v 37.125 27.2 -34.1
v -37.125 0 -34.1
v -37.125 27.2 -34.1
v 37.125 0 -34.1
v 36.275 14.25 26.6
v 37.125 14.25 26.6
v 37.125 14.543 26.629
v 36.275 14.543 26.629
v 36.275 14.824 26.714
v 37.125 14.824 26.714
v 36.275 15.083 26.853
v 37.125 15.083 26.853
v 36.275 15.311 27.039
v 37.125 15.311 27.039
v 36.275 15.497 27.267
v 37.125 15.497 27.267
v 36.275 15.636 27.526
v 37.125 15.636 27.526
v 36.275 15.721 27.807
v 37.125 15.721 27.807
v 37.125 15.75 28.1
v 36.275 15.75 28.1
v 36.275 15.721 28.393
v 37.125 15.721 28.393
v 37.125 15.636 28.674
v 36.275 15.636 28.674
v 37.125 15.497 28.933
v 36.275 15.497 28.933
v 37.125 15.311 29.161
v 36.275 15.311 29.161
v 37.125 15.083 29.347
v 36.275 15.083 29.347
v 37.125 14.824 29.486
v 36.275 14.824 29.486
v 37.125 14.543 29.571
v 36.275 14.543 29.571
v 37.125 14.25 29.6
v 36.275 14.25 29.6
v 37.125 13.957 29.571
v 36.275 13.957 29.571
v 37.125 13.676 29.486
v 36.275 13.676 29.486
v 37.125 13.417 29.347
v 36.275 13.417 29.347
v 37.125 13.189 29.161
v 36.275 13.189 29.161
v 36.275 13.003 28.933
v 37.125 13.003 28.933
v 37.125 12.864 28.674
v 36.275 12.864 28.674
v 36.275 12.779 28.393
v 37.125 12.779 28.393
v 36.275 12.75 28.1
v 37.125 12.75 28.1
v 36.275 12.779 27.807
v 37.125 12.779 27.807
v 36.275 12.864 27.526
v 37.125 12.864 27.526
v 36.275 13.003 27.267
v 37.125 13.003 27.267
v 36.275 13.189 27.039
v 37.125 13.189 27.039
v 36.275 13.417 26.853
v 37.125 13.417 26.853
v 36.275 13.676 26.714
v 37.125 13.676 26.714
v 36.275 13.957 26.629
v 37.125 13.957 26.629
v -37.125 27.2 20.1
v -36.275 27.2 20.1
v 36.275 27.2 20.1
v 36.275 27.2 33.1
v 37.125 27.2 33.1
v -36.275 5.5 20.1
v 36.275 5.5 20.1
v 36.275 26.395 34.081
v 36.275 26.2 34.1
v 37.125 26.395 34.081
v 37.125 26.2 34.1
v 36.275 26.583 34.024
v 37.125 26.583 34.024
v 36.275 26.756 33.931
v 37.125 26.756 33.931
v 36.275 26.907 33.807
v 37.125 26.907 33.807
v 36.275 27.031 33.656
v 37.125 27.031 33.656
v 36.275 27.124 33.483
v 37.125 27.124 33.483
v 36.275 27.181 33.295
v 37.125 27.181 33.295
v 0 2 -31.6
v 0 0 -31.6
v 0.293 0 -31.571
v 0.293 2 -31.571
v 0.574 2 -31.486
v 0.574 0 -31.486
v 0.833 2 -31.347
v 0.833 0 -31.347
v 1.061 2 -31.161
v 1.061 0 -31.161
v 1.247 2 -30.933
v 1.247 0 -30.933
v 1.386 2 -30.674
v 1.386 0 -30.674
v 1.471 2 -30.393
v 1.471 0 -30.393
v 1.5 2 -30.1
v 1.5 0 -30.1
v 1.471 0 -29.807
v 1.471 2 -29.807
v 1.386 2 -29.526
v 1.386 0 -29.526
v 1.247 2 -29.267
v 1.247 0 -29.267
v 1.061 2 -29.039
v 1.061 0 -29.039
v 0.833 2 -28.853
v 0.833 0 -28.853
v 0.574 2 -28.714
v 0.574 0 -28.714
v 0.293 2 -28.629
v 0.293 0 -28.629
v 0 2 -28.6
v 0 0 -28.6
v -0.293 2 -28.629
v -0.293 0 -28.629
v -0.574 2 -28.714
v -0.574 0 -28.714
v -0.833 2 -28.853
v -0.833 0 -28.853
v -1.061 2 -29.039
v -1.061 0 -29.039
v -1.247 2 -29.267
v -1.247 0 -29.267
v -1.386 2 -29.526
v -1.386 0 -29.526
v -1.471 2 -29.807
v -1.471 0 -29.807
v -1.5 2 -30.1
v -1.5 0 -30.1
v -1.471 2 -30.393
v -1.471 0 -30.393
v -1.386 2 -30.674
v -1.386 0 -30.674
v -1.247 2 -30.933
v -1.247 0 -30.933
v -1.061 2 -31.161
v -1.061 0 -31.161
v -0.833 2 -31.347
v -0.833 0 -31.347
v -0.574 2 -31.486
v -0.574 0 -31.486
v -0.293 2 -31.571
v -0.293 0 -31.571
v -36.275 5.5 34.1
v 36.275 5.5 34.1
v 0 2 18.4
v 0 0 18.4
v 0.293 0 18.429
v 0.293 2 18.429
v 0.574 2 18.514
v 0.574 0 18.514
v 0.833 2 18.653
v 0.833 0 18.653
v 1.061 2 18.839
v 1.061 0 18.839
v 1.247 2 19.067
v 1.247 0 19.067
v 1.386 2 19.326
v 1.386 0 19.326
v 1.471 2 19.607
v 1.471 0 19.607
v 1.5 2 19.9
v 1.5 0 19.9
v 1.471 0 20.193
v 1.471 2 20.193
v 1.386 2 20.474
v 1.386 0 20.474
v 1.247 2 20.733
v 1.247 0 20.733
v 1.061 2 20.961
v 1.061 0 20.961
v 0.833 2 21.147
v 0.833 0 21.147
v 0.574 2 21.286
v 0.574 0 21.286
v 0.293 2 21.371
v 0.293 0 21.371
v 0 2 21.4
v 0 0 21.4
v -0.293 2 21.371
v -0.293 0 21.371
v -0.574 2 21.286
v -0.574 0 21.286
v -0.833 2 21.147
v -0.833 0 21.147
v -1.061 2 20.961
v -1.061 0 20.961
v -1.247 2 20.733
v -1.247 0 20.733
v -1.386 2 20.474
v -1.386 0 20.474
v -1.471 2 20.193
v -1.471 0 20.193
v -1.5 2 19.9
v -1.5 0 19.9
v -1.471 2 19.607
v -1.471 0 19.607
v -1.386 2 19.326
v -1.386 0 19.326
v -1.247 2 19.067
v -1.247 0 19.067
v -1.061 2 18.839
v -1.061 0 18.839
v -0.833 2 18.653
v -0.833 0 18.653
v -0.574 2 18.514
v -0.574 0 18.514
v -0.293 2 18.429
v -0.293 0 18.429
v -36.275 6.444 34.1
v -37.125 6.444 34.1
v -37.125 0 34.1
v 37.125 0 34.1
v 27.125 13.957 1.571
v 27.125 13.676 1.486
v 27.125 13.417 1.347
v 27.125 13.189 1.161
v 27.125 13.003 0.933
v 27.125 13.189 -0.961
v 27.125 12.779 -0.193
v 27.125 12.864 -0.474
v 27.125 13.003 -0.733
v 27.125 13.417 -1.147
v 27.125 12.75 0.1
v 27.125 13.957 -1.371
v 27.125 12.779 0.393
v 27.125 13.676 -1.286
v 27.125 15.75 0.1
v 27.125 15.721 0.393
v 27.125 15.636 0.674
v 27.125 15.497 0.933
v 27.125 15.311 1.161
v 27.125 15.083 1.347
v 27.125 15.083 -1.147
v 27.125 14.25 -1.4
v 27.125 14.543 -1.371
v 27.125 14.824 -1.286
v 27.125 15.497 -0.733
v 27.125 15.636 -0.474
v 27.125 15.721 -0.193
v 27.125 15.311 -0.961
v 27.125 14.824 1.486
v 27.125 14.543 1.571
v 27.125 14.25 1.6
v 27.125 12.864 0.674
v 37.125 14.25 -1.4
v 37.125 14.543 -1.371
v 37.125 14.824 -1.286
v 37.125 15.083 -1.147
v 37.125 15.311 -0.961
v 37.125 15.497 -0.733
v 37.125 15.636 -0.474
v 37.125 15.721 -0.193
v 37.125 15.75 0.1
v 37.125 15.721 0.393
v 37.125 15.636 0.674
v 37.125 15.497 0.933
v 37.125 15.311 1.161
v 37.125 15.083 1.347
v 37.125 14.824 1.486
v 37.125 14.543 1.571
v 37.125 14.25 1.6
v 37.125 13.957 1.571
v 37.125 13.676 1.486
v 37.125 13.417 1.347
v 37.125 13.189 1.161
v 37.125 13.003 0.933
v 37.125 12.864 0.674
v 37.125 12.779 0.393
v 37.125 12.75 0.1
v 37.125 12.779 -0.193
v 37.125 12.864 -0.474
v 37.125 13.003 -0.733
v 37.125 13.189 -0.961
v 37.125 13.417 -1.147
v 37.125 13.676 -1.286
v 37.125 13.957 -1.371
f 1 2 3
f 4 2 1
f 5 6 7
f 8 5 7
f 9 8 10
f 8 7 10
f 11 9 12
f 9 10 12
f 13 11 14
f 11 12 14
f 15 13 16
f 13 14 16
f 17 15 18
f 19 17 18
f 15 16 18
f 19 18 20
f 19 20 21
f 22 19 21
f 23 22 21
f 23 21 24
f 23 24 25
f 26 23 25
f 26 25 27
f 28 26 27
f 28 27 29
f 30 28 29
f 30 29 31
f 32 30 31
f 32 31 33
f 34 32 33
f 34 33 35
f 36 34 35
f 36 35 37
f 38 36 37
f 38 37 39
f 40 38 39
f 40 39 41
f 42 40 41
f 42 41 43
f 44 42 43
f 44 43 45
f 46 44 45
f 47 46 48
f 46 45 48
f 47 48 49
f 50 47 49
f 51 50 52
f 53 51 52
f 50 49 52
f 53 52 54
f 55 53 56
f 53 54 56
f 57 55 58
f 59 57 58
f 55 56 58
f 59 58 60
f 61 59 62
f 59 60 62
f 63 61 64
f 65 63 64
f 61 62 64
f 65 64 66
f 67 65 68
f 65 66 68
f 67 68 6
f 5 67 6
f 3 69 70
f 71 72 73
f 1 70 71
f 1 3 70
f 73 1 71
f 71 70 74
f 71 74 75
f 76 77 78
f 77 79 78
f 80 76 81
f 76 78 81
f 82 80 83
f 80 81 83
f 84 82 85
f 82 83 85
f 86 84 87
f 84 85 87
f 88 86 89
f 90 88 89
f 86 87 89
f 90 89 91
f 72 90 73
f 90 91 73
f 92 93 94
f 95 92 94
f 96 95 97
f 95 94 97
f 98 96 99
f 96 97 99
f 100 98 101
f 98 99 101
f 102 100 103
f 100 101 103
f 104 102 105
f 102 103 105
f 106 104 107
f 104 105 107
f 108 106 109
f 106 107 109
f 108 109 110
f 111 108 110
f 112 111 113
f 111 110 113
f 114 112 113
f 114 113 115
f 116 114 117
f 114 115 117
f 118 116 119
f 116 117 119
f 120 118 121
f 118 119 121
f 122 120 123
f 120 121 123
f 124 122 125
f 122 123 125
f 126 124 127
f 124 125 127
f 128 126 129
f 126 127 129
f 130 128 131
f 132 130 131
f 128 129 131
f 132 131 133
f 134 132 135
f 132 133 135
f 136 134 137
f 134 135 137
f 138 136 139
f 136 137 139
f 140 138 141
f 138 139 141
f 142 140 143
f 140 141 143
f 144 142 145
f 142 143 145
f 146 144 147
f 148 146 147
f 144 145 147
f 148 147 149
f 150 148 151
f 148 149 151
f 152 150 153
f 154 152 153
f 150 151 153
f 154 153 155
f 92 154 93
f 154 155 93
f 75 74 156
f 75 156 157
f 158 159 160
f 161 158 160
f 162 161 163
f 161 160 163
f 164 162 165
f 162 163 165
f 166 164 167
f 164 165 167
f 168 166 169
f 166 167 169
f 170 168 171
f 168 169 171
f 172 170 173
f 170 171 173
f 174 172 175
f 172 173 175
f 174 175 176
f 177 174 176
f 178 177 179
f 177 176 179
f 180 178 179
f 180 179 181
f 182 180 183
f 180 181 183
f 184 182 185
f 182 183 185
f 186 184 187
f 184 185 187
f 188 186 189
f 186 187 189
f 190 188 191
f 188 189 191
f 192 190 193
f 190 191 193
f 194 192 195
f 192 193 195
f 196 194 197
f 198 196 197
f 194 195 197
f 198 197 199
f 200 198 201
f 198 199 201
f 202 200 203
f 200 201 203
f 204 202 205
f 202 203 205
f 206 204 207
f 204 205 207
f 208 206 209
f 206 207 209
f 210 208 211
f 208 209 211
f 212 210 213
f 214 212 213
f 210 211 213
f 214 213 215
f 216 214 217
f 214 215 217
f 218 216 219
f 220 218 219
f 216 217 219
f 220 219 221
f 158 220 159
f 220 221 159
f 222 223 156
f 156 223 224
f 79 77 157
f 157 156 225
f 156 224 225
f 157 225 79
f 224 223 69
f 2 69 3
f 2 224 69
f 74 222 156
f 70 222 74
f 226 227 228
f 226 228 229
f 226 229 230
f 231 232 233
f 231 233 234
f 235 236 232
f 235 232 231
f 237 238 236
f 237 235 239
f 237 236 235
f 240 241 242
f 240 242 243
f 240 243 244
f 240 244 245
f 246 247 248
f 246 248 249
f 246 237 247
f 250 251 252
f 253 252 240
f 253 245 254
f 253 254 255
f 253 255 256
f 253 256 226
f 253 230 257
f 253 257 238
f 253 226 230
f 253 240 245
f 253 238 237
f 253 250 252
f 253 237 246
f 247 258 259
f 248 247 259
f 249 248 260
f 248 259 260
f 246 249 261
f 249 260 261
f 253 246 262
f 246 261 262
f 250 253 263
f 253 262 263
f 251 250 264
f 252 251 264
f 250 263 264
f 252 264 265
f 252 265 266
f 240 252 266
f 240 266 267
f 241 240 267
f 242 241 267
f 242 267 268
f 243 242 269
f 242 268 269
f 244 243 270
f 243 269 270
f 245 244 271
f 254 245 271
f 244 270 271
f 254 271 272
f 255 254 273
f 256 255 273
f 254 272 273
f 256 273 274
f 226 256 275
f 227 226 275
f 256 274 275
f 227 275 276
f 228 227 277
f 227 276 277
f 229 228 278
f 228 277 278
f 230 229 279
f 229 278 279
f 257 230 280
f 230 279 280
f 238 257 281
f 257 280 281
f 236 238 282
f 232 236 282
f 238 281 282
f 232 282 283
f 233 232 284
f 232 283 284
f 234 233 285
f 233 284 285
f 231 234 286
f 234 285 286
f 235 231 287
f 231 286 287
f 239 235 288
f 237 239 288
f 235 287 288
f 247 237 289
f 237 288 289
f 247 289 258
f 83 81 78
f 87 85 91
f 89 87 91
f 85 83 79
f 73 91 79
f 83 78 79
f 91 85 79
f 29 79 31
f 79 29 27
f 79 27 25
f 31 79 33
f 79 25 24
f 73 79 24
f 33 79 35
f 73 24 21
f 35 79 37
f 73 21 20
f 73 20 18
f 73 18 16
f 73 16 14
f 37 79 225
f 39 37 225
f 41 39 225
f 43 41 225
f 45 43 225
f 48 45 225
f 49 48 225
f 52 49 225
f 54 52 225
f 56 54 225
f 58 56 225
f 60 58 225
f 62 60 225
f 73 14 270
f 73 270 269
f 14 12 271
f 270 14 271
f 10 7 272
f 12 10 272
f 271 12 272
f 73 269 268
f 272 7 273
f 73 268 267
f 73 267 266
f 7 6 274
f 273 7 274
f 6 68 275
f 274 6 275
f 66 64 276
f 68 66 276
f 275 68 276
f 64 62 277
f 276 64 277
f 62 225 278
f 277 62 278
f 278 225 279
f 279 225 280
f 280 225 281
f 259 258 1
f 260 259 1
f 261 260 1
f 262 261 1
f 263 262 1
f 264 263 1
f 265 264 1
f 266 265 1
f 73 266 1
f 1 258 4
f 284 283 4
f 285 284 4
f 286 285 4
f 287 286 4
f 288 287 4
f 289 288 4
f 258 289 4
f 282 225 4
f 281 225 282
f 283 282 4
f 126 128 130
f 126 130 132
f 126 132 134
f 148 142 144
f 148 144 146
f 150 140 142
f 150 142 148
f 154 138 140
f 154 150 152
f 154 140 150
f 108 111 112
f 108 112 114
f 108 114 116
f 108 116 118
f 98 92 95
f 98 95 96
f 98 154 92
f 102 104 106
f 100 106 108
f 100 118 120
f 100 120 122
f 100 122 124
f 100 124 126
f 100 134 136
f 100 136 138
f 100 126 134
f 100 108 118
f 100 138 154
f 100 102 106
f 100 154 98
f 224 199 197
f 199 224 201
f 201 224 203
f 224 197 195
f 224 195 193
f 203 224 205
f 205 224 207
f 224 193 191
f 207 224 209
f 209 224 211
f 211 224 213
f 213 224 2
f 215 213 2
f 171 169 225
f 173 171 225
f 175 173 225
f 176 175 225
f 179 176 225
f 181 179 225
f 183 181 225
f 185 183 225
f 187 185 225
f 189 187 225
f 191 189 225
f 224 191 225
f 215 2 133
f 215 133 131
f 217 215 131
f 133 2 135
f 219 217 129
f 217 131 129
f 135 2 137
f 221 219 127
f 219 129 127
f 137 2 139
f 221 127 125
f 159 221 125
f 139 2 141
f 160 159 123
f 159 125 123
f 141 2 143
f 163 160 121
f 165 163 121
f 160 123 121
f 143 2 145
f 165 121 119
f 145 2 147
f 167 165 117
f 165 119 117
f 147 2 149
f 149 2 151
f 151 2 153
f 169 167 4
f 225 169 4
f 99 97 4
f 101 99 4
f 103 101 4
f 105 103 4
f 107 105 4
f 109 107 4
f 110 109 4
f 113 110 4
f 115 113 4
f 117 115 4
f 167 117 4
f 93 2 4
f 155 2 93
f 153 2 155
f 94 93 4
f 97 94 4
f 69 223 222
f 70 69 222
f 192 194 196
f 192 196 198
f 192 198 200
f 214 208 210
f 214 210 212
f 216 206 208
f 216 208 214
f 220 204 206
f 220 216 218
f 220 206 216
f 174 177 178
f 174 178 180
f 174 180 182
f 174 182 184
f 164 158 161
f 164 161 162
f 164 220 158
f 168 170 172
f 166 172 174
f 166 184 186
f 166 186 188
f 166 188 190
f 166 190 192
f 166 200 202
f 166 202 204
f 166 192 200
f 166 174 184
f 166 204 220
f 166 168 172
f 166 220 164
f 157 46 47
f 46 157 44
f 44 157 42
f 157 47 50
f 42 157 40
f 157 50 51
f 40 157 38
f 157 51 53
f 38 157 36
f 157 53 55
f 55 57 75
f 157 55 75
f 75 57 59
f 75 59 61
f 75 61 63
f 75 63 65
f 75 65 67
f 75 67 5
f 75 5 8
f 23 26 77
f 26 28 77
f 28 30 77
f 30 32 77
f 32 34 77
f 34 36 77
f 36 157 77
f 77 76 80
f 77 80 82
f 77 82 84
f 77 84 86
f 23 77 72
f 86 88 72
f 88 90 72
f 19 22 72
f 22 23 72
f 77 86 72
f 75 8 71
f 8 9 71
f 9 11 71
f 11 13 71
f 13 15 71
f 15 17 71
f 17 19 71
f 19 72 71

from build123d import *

# Parameters (mm, degrees)
SKETCH1_W           = 74.25
SKETCH1_H           = 68.2
BOSS_EXTRUDE1_DEPTH = 27.2
SKETCH2_R           = 1.5
CUT_EXTRUDE1_DEPTH  = 10
SKETCH3_W           = 72.55
SKETCH3_H           = 14
CUT_EXTRUDE2_DEPTH  = 21.7
CHAMFER1_SIZE       = 14
CHAMFER1_SIZE2      = 20.755853559
FILLET1_R           = 1
SKETCH4_R           = 1.5
CUT_EXTRUDE3_DEPTH  = 2


with BuildPart() as part:
    # Sketch1 → Boss-Extrude1 (new body)
    with BuildSketch(Plane(origin=(0, 0, 0), x_dir=(1, 0, 0), z_dir=(0, 1, 0))):
        Rectangle(SKETCH1_W, SKETCH1_H)
    extrude(amount=BOSS_EXTRUDE1_DEPTH)

    # Sketch2 → Cut-Extrude1 (cut)
    with BuildSketch(Plane(origin=(37.125, 0, 0), x_dir=(0, 0, -1), z_dir=(1, 0, 0))):
        with Locations((-28.1, 14.25)):
            Circle(SKETCH2_R)
        with Locations((-0.1, 14.25)):
            Circle(SKETCH2_R)
    extrude(amount=-CUT_EXTRUDE1_DEPTH, mode=Mode.SUBTRACT)

    # Sketch3 → Cut-Extrude2 (cut)
    with BuildSketch(Plane(origin=(0, 27.2, 0), x_dir=(1, 0, 0), z_dir=(0, 1, 0))):
        with Locations((0, -27.1)):
            Rectangle(SKETCH3_W, SKETCH3_H)
    extrude(amount=-CUT_EXTRUDE2_DEPTH, mode=Mode.SUBTRACT)

    # Chamfer1
    chamfer1_edges = [part.edges().sort_by_distance(p)[0] for p in [
        (-36.7, 27.2, 34.1),
    ]]
    chamfer1_side = [part.faces().sort_by_distance(p)[0] for p in [
        (0, 27.2, -6.799518298),
    ]]
    chamfer(chamfer1_edges, length=CHAMFER1_SIZE, length2=CHAMFER1_SIZE2, reference=chamfer1_side[0])

    # Fillet1
    fillet1_edges = [part.edges().sort_by_distance(p)[0] for p in [
        (36.7, 27.2, 34.1),
    ]]
    fillet(fillet1_edges, radius=FILLET1_R)

    # Sketch4 → Cut-Extrude3 (cut)
    with BuildSketch(Plane.XZ):
        with Locations(Location((0, -30.1, 0), (0, 0, 270))):
            Circle(SKETCH4_R)
        with Locations(Location((0, 19.9, 0), (0, 0, 270))):
            Circle(SKETCH4_R)
    extrude(amount=-CUT_EXTRUDE3_DEPTH, mode=Mode.SUBTRACT)


solid = part.part
